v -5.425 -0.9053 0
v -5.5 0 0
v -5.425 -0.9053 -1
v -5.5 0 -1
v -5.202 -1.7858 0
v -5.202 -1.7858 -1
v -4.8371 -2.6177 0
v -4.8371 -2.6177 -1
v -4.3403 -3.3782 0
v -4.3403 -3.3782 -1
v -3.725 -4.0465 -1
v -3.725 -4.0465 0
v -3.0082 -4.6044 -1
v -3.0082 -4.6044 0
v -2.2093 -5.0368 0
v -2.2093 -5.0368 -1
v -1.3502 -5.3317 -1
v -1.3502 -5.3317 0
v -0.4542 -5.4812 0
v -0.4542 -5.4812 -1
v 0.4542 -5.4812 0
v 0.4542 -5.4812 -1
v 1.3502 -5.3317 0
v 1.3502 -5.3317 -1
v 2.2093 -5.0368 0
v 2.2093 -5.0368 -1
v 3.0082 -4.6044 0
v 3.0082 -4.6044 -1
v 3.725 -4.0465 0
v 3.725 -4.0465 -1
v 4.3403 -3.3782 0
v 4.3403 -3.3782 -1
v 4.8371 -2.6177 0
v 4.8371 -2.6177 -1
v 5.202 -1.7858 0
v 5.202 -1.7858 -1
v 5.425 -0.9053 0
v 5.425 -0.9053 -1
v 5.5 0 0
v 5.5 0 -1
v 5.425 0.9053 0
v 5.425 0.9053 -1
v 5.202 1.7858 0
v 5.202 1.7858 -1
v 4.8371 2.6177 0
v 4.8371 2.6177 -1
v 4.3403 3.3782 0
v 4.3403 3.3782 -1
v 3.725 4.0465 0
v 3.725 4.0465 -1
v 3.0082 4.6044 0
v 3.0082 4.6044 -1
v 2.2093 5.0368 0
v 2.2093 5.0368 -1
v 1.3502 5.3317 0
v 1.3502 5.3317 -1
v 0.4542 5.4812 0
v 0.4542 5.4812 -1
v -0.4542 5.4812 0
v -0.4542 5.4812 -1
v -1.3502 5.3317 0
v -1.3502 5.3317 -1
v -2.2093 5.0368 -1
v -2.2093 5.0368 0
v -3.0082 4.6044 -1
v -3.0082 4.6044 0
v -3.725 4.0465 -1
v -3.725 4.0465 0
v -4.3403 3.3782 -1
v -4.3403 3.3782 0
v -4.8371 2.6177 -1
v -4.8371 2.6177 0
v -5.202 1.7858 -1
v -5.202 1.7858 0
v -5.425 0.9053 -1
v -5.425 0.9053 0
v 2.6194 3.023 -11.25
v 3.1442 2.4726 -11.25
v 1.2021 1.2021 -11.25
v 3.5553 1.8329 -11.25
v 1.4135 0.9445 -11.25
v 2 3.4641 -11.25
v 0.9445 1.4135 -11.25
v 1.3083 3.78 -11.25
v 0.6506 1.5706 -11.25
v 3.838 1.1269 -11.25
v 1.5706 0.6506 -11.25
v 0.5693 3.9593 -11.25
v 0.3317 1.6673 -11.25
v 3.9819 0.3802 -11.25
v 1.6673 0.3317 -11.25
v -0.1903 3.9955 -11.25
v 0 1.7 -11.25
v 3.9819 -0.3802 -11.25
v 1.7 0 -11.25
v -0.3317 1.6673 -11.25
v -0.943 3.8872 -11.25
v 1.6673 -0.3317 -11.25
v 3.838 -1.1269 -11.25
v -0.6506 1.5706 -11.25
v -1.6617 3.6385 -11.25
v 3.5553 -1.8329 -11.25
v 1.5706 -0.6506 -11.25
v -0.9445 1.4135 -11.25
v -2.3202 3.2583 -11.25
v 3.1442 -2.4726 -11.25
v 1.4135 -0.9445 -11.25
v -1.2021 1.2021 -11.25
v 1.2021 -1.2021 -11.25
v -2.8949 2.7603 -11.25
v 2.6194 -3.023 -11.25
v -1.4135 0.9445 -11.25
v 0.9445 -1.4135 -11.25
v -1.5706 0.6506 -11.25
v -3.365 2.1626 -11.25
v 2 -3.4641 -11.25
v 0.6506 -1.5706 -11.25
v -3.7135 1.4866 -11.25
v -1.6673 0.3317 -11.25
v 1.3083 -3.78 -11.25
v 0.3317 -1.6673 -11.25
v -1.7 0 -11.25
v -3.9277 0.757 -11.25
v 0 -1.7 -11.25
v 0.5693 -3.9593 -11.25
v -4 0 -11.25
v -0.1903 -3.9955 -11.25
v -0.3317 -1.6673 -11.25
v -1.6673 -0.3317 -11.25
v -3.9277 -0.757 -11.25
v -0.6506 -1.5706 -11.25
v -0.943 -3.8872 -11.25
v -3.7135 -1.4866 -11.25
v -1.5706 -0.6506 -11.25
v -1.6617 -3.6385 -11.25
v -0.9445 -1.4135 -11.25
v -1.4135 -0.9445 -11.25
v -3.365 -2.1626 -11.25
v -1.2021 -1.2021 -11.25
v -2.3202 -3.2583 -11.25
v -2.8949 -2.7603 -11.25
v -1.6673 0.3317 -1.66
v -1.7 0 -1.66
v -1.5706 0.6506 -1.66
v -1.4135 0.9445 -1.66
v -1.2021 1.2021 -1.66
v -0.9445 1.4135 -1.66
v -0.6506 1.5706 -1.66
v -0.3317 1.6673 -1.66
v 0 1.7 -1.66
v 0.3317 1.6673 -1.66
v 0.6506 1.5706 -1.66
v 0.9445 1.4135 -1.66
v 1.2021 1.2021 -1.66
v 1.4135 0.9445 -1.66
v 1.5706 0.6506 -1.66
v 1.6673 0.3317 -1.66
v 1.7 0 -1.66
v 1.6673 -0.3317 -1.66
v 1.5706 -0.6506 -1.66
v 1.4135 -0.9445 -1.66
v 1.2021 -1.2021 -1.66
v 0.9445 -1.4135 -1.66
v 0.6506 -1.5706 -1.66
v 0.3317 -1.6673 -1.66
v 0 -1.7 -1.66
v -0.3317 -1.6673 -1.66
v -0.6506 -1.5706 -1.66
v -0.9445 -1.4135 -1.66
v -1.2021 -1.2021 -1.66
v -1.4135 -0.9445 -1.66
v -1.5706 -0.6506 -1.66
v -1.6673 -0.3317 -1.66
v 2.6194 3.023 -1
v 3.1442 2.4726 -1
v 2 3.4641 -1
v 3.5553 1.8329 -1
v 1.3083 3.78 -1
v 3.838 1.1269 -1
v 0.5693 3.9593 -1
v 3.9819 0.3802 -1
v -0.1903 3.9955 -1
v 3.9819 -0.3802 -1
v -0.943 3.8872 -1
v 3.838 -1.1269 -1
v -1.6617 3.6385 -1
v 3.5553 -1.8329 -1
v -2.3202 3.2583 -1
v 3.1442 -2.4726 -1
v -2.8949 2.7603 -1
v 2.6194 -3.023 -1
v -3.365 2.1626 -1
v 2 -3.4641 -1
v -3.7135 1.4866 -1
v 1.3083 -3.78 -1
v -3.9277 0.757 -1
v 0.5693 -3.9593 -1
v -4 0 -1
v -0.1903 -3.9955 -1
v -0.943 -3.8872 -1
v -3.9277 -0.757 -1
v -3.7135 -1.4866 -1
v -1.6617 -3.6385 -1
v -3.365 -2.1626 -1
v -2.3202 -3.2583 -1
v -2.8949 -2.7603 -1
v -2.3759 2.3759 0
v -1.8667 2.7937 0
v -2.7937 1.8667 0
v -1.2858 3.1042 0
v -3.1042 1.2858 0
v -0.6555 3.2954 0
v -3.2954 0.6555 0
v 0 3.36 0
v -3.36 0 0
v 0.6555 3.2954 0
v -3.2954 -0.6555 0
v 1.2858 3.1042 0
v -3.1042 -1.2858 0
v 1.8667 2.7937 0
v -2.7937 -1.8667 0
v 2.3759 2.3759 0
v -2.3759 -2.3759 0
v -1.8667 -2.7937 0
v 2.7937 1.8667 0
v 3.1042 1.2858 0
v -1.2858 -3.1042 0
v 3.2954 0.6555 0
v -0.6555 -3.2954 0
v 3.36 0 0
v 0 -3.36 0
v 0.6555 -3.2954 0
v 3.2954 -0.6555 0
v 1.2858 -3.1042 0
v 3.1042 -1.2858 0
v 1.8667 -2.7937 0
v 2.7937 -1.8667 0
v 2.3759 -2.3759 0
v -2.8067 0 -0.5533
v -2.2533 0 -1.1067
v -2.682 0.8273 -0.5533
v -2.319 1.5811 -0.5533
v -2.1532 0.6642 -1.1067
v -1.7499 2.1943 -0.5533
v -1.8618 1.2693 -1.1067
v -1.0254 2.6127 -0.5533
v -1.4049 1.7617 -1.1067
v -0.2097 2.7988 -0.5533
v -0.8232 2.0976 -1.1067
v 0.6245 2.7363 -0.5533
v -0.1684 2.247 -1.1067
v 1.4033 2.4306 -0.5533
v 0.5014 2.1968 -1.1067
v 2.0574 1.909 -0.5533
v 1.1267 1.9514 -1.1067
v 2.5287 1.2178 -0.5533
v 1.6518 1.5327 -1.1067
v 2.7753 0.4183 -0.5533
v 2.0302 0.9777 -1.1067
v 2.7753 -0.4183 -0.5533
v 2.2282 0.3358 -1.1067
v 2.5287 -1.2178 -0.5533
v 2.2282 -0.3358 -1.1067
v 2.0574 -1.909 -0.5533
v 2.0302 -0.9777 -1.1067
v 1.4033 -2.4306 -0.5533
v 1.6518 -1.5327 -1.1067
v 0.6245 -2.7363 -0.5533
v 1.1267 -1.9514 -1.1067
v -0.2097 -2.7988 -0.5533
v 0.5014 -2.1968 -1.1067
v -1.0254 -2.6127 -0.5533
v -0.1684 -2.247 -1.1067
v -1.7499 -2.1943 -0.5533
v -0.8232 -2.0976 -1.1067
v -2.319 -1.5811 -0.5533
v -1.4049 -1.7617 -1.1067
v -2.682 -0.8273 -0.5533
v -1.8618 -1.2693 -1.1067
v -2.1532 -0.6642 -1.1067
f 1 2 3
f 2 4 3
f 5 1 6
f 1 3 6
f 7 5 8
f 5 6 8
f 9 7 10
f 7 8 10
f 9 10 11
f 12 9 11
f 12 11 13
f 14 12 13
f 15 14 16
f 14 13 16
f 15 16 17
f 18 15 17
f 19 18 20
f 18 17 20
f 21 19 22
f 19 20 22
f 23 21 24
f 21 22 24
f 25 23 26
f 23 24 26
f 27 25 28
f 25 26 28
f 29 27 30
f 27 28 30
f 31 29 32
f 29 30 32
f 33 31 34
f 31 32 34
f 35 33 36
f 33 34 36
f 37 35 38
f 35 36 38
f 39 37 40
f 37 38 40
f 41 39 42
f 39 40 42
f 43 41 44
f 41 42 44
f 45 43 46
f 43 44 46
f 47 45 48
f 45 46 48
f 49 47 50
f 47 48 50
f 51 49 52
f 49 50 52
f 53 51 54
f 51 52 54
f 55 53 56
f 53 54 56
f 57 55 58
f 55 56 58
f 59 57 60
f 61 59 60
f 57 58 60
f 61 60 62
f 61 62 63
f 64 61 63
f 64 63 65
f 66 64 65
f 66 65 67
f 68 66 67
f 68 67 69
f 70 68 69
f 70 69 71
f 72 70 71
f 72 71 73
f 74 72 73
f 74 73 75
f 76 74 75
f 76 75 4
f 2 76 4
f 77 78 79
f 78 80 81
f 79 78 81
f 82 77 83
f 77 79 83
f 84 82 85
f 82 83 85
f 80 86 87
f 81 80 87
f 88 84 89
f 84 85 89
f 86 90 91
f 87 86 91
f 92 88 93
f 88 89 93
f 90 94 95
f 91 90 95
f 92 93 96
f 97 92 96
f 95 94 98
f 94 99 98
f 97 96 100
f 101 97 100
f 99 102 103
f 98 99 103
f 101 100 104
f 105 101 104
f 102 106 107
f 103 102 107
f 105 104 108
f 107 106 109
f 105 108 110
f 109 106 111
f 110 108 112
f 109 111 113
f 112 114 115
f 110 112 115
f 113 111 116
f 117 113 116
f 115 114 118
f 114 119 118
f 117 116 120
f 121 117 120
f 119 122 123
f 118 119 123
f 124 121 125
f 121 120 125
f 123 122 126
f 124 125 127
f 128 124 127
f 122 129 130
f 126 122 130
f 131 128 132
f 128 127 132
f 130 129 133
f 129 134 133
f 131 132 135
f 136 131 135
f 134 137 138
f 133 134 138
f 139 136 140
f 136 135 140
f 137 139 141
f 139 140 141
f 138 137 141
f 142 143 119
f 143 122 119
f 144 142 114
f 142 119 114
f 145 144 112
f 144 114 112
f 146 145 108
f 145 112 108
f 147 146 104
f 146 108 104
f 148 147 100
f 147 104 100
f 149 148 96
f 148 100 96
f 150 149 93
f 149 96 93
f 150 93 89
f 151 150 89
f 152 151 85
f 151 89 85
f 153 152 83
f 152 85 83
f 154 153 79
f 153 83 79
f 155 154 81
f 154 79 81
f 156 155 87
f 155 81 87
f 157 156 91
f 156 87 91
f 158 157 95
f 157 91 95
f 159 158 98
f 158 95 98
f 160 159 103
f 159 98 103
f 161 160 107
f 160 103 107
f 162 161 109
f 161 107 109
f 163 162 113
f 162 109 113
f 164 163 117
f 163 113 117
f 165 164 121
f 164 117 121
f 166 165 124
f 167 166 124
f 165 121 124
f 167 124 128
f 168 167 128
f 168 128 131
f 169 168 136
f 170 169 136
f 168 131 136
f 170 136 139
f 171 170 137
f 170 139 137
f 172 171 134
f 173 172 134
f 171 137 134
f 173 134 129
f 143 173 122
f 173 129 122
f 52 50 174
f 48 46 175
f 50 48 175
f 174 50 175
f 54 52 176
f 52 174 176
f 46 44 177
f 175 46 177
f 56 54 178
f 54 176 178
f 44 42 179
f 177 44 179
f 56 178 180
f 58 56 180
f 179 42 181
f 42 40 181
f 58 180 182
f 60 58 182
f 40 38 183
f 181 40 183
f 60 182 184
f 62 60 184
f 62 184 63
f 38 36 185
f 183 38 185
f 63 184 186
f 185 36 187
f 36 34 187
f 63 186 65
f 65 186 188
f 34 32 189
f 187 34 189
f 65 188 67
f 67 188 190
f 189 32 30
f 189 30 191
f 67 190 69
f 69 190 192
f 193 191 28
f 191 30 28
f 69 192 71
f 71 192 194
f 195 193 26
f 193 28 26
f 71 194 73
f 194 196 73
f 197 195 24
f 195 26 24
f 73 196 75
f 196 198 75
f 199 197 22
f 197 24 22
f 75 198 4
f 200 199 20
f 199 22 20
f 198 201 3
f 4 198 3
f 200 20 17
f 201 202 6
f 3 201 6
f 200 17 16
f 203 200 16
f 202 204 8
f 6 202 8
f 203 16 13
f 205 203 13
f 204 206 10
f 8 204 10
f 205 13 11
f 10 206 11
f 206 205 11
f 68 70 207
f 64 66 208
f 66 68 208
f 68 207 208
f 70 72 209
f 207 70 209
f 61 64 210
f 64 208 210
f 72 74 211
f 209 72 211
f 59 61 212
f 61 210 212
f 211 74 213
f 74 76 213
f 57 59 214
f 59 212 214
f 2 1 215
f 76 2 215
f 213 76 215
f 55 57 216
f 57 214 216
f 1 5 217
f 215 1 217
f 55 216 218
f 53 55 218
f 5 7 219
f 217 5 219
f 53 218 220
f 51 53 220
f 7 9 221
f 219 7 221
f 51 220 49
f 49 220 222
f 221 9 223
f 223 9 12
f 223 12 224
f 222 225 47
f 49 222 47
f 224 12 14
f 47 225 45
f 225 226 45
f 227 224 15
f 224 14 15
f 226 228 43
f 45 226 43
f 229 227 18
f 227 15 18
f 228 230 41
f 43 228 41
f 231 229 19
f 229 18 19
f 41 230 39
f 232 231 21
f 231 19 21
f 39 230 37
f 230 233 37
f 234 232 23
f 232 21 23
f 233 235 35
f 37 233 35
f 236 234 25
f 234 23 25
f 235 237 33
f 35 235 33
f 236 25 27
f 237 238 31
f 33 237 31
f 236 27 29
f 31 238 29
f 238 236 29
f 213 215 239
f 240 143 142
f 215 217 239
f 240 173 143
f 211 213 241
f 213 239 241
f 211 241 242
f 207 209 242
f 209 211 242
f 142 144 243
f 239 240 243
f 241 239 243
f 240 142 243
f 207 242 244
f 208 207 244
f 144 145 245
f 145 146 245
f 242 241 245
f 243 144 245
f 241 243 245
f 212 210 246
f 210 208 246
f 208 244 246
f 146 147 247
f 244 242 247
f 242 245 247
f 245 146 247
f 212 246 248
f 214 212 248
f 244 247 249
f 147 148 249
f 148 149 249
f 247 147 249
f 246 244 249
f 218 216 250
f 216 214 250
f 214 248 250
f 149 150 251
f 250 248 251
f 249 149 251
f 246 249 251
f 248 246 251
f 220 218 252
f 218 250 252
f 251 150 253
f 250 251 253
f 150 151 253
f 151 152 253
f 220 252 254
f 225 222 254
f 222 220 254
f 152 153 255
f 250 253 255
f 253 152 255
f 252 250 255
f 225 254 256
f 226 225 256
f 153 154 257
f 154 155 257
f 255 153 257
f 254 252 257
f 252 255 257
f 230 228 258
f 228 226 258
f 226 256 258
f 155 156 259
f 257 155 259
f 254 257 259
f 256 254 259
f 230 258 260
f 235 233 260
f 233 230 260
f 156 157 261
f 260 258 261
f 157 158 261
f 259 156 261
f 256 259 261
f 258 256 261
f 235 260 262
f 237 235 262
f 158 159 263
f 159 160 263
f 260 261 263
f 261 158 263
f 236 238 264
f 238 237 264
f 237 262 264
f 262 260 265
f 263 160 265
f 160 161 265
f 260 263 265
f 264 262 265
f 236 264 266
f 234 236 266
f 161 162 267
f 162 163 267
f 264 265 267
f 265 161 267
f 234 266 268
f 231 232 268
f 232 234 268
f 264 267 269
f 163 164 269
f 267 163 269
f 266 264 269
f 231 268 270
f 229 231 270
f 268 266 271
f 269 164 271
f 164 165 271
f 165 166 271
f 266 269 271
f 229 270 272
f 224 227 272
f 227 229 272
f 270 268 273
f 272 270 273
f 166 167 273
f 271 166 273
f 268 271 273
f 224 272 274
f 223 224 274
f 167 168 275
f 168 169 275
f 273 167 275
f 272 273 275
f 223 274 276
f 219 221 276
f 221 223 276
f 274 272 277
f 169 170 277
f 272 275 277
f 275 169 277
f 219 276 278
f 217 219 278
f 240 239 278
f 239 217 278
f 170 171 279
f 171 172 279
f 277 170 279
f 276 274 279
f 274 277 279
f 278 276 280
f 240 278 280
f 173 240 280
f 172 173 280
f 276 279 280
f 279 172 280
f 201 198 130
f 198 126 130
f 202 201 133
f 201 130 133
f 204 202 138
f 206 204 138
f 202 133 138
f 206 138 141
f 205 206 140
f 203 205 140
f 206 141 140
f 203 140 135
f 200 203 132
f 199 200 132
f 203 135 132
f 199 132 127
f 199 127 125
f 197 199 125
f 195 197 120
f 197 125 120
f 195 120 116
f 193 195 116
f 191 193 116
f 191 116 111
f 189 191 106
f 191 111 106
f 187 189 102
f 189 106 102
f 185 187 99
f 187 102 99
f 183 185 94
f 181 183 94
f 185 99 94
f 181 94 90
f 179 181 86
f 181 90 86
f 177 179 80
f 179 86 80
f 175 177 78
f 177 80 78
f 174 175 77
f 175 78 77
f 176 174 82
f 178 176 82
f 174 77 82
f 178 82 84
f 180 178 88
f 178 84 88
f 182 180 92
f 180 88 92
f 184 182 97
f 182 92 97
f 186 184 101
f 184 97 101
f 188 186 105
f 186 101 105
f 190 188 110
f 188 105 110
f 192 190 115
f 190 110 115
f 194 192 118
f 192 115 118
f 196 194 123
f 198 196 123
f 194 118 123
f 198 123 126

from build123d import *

# Parameters (mm, degrees)
REFRENTADO_PARA_TORNILLO_TAP_N_CON_CABEZ_D           = 3.4
REFRENTADO_PARA_TORNILLO_TAP_N_CON_CABEZ_CSINK_D     = 6.72
REFRENTADO_PARA_TORNILLO_TAP_N_CON_CABEZ_CSINK_ANGLE = 90


with BuildPart() as part:
    # Croquis1 → Revolución1 (revolve)
    with BuildSketch(Plane(origin=(0, 0, 0), x_dir=(1, 0, 0), z_dir=(0, 1, 0))):
        Polygon((-1.5, 11.25), (-1.5, 0), (-5.5, 0), (-5.5, 1), (-4, 1), (-4, 11.25), align=None)
    revolve(axis=Axis((0, 0, -19.14213198), (0, 0, 1)))

    # Refrentado para tornillo tapón con cabeza plana de clavija de M31 (through all)
    with Locations(Plane.XY):
        with Locations((0, 0)):
            CounterSinkHole(REFRENTADO_PARA_TORNILLO_TAP_N_CON_CABEZ_D / 2, REFRENTADO_PARA_TORNILLO_TAP_N_CON_CABEZ_CSINK_D / 2, counter_sink_angle=REFRENTADO_PARA_TORNILLO_TAP_N_CON_CABEZ_CSINK_ANGLE)


solid = part.part
